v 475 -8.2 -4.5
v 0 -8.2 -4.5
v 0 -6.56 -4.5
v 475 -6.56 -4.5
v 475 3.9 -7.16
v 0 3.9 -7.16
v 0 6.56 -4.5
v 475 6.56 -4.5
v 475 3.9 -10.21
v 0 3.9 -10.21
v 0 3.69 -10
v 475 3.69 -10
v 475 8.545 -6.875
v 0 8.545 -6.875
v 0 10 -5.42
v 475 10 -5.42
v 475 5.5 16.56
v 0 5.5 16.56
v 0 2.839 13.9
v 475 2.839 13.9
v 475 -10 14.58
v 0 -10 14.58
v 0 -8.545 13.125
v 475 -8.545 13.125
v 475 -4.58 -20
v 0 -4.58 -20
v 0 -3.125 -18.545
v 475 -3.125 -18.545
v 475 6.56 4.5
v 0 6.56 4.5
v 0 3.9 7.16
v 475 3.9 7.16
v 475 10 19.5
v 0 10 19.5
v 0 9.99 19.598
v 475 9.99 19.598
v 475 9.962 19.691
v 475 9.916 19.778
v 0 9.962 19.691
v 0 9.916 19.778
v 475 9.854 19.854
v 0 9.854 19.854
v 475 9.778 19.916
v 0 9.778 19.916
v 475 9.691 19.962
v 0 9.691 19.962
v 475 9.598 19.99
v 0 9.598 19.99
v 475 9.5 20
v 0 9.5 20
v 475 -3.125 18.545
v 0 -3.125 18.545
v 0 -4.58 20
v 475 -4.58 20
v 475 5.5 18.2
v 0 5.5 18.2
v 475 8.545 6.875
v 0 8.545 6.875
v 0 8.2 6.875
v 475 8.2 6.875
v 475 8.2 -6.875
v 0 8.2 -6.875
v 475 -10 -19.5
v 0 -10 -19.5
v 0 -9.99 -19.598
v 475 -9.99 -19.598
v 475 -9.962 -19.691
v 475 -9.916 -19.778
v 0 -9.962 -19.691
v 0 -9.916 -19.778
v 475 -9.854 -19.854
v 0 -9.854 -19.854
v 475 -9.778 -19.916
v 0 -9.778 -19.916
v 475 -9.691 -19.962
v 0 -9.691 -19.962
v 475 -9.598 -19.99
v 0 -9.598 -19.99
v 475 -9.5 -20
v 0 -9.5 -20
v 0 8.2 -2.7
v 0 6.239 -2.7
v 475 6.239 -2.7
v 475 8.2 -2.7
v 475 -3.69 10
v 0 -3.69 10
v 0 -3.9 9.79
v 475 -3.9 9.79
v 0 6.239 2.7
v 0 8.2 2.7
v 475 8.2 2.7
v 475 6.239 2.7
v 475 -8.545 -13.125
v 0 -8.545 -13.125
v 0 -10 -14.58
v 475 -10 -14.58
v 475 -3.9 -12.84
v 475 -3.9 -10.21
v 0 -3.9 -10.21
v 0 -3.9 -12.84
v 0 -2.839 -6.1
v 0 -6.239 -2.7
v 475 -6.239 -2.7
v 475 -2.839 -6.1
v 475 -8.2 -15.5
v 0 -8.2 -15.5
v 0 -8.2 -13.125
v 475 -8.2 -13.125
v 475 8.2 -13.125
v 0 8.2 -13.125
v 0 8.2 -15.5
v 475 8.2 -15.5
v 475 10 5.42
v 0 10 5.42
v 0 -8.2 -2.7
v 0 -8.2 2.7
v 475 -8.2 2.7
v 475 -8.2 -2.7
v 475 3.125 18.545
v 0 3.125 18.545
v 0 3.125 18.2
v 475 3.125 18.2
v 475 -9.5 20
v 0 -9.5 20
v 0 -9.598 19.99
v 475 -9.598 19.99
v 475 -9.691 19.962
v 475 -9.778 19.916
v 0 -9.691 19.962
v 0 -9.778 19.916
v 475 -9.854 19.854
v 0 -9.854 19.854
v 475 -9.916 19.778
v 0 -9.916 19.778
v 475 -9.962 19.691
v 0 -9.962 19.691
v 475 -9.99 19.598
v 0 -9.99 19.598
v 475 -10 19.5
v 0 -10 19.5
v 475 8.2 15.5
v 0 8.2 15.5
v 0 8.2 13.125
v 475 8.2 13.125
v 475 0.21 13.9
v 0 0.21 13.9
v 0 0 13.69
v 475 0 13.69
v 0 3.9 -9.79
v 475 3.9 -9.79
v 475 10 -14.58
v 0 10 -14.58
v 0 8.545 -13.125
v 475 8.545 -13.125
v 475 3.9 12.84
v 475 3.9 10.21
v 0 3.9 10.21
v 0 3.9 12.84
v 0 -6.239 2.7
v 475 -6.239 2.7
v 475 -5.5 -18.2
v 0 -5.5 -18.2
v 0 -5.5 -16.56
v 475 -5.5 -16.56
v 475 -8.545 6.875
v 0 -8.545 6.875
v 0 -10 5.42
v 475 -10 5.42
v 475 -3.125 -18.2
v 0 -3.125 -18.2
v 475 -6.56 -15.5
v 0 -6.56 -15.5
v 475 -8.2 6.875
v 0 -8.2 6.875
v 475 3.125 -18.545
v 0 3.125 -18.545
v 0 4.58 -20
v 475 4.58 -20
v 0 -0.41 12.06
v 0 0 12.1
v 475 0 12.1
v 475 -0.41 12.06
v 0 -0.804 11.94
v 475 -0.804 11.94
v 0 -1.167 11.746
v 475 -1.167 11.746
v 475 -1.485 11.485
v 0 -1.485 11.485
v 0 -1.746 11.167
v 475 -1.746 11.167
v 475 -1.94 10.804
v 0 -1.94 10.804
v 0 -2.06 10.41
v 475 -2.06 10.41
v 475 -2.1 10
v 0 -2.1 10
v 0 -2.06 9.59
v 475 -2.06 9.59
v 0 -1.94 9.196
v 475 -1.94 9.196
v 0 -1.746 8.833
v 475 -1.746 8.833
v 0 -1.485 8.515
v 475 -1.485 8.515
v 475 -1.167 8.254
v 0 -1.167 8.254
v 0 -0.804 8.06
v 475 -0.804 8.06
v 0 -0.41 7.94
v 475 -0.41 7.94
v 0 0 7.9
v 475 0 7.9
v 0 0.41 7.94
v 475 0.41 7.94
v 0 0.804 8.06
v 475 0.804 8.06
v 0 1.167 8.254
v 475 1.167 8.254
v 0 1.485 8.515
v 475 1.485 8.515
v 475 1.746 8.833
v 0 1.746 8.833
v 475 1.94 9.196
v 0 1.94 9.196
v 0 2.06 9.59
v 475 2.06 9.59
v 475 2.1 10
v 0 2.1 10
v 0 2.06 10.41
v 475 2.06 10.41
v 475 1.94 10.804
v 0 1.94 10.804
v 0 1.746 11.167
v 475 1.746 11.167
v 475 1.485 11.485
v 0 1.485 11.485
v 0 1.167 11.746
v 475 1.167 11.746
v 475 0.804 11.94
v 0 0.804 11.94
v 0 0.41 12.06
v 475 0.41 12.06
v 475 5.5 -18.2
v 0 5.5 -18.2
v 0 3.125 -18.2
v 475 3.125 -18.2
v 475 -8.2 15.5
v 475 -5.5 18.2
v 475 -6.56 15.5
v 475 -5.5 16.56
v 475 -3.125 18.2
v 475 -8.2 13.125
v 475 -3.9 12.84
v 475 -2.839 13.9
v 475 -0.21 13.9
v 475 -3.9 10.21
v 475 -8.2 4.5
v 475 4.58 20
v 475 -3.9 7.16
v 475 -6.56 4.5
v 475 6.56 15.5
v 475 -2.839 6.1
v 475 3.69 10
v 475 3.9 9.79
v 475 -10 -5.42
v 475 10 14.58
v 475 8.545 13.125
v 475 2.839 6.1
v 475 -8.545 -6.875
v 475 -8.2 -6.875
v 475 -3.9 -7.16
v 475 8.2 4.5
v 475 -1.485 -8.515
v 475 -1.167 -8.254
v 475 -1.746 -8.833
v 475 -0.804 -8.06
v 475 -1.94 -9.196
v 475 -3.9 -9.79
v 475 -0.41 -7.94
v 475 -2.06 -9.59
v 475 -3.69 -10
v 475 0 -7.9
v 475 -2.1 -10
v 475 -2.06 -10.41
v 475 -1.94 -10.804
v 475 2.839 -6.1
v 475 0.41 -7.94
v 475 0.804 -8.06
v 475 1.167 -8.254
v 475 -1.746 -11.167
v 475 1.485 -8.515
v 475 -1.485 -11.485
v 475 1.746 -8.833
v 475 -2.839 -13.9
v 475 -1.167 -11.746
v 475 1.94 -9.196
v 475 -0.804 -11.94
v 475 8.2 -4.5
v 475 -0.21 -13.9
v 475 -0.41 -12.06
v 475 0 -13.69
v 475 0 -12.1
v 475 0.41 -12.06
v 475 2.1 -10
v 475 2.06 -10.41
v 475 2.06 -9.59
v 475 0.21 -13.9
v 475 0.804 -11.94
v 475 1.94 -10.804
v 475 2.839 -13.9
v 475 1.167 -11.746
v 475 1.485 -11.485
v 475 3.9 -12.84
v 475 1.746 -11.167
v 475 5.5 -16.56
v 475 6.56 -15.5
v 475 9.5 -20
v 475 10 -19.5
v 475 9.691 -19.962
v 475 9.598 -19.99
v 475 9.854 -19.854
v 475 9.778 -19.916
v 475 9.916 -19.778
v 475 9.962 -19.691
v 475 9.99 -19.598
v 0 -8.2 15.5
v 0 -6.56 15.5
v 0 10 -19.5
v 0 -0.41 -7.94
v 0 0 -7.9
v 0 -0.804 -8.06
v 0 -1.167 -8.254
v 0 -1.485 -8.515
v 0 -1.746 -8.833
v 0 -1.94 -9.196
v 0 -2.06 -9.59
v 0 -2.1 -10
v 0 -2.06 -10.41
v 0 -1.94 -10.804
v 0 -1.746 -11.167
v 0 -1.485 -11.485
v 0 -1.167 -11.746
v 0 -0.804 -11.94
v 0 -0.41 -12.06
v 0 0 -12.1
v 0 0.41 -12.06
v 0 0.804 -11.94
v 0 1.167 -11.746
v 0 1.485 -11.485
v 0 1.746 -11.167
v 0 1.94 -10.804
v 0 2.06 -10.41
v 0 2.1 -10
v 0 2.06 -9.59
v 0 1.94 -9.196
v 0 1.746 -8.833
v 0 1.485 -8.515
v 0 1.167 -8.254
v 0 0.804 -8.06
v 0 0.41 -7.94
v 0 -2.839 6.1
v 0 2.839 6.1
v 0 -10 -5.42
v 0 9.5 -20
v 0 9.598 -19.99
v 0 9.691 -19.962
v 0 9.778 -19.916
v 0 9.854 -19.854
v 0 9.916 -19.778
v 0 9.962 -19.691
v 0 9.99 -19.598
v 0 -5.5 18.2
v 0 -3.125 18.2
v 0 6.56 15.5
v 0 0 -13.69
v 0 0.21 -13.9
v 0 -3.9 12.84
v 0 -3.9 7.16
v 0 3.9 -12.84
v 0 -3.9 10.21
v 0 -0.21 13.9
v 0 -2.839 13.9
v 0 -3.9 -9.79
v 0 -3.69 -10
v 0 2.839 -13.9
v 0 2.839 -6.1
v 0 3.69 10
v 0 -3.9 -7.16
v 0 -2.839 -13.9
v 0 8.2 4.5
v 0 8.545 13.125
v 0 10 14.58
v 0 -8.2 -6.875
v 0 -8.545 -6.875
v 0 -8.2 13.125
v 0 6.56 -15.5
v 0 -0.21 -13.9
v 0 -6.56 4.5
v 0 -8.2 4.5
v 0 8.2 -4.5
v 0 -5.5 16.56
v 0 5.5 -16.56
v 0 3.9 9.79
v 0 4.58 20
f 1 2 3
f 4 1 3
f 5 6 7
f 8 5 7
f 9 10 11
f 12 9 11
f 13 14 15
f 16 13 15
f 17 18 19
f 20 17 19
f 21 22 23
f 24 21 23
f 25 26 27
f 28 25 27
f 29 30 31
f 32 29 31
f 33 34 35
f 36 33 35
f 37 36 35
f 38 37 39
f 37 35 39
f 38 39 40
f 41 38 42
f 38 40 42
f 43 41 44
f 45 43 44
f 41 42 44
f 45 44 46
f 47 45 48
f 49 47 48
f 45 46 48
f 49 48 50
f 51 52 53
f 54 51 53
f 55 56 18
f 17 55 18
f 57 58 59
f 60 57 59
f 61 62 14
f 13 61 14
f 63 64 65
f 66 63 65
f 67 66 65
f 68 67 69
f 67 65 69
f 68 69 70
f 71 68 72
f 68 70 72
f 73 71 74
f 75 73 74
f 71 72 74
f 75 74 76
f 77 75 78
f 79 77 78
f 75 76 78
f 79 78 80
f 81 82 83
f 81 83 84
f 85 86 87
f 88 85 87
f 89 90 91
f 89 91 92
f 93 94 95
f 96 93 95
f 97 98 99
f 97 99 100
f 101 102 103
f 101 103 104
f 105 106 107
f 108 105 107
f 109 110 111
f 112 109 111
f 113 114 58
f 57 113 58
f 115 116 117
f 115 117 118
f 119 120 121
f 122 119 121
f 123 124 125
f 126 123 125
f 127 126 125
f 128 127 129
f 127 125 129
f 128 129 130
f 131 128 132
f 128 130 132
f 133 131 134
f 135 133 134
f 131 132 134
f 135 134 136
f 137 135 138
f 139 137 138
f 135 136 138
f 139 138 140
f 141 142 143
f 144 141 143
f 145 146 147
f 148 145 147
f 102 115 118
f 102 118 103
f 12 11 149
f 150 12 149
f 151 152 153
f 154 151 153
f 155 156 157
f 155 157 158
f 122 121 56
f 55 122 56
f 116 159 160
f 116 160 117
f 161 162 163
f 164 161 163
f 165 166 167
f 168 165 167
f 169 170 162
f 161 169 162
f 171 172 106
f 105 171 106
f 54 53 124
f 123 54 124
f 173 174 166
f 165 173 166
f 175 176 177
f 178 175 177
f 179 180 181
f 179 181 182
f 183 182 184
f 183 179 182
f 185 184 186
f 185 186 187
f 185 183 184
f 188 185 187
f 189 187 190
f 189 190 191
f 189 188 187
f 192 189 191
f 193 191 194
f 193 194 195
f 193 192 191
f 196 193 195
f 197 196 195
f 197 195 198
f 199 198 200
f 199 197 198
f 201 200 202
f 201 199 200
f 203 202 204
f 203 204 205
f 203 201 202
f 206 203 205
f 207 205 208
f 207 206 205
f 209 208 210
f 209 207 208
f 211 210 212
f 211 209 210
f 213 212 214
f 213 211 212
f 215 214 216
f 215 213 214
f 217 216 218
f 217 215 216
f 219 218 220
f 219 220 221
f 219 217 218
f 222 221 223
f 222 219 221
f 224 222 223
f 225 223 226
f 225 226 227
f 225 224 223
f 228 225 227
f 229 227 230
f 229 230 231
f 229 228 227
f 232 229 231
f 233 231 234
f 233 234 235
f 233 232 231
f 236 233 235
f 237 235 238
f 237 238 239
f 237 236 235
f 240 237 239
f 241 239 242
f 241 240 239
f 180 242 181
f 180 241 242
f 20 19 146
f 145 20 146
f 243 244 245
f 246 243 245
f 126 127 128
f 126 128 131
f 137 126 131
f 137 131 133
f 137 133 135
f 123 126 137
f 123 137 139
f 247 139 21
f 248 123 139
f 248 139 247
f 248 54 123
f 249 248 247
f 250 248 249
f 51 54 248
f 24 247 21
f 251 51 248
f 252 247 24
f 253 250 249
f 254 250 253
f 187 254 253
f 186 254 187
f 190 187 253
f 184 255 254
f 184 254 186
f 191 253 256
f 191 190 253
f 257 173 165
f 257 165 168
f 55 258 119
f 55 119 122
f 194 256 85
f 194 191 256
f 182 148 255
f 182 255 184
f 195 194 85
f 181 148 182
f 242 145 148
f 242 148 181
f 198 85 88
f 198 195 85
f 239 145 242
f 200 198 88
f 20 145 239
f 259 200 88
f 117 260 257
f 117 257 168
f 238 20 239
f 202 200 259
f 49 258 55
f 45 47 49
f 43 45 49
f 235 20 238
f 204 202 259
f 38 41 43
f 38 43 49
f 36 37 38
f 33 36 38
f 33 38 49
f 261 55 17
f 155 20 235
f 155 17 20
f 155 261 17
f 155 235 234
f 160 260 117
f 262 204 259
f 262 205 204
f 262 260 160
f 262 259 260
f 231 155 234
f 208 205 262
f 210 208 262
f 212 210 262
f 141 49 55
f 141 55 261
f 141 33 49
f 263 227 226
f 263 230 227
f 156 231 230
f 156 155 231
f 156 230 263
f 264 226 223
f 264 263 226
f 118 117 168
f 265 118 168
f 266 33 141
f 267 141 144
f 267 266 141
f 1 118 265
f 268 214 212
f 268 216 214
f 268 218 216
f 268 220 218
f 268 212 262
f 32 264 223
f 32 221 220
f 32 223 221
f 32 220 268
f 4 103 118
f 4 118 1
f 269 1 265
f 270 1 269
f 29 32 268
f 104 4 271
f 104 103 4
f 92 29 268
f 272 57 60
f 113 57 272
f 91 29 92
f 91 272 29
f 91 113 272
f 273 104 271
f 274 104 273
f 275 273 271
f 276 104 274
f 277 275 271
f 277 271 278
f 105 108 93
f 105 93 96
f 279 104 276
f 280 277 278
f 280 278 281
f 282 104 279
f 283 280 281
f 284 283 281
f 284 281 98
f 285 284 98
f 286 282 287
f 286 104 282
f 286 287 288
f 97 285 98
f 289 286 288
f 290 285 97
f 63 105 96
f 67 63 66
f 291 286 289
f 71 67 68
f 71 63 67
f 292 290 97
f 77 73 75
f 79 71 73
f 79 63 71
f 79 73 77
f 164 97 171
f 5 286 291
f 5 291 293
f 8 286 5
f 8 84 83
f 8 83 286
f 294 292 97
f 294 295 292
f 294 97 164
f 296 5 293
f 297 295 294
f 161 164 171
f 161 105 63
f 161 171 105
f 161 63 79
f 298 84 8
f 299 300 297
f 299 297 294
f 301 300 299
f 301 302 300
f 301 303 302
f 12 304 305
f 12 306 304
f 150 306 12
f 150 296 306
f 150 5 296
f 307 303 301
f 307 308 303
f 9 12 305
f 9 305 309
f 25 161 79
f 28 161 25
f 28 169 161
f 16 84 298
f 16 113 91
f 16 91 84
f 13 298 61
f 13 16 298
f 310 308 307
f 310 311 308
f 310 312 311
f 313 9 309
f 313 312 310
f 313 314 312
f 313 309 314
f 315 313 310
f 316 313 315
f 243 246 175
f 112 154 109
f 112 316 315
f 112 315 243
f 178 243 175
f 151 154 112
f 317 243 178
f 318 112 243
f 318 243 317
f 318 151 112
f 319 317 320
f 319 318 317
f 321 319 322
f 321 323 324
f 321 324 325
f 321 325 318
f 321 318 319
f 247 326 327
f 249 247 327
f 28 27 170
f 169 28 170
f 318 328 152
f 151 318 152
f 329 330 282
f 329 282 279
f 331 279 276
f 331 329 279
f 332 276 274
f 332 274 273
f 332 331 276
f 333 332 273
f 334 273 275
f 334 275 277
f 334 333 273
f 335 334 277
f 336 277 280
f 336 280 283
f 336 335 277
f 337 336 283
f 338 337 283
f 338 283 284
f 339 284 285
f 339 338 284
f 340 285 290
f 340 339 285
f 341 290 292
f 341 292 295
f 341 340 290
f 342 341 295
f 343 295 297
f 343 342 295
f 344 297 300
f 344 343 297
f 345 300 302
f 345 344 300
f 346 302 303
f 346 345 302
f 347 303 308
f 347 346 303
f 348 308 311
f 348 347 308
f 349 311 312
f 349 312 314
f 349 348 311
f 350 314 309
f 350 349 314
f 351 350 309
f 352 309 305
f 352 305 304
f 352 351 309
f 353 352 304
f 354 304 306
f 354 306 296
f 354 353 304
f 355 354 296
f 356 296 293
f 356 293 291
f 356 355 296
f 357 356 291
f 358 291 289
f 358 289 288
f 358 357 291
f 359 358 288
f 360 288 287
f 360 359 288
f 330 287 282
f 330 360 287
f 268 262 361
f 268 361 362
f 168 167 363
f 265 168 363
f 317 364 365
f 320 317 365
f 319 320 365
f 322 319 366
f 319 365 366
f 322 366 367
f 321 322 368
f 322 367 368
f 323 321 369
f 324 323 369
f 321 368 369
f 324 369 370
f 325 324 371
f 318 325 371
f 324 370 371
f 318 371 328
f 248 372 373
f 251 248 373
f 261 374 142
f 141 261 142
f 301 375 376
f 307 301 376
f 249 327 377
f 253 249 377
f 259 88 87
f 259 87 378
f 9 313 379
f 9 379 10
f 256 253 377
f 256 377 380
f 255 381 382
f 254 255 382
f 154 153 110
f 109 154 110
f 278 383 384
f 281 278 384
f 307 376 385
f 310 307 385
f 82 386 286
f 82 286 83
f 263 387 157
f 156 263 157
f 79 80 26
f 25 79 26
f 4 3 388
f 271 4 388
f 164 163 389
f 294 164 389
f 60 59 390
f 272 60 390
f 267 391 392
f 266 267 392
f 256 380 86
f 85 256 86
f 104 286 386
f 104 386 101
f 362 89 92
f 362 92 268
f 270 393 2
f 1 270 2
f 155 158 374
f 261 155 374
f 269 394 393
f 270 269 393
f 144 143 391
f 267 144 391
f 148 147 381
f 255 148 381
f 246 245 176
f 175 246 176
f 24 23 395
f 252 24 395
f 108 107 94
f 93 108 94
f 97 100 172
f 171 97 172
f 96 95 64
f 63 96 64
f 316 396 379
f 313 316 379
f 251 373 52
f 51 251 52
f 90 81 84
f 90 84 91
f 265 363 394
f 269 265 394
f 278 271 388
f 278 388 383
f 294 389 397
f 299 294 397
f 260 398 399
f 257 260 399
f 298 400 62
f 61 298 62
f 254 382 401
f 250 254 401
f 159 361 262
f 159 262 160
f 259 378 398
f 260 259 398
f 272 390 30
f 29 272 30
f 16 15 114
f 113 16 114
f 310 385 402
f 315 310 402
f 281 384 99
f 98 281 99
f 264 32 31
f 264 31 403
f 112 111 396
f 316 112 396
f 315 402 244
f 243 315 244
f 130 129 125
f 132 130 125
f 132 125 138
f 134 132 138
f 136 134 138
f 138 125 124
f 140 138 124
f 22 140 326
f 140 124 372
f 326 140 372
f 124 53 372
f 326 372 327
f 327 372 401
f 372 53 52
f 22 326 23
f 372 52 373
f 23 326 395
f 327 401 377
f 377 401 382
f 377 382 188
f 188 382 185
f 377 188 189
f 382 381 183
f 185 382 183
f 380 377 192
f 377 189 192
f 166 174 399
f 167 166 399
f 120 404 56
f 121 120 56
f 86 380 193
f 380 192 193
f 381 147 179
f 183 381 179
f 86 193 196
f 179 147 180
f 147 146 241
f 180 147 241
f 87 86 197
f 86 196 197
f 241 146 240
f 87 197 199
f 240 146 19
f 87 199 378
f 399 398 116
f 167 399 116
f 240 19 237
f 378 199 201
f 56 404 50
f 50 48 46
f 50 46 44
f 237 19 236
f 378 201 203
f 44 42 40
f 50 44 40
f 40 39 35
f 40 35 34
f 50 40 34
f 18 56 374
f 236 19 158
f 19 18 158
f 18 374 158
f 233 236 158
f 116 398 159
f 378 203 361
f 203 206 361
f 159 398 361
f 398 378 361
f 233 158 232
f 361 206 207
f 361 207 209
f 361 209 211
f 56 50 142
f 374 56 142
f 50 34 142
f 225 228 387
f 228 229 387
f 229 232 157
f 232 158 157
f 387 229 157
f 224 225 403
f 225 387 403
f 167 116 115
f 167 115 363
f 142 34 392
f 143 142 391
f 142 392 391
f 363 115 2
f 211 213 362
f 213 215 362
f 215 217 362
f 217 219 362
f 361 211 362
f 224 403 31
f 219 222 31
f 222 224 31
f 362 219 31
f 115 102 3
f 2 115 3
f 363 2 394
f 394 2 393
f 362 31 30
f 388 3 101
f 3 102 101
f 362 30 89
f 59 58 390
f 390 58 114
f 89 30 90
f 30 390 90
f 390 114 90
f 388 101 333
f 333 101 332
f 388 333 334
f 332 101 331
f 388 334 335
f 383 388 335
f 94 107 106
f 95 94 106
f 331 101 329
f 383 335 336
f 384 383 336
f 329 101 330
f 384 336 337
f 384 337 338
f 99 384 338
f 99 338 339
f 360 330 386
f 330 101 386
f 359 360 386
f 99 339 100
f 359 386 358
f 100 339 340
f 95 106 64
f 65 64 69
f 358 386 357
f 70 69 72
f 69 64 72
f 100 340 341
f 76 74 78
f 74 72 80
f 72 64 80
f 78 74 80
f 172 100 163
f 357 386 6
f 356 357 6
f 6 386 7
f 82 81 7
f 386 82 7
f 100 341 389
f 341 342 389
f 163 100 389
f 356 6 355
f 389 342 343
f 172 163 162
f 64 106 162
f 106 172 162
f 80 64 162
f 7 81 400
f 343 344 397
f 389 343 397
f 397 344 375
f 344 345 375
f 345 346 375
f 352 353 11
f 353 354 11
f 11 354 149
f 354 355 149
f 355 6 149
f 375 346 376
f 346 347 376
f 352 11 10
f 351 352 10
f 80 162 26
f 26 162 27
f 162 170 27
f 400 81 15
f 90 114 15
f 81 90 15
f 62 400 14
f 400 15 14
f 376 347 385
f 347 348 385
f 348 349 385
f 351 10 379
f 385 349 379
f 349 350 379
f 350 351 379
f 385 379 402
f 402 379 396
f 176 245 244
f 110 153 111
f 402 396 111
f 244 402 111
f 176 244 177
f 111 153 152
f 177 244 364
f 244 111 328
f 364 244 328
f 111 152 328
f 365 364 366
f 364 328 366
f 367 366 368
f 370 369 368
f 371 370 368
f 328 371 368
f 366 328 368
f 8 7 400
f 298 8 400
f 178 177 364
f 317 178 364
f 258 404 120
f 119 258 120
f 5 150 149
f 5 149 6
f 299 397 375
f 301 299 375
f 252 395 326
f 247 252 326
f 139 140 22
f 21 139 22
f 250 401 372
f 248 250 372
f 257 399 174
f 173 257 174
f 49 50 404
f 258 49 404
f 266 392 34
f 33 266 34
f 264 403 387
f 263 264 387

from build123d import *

# Parameters (mm, degrees)
PROFILE_SKETCH_R      = 2.1
PROFILE_EXTRUDE_DEPTH = 475


with BuildPart() as part:
    # Profile Sketch → Profile Extrude (new body)
    with BuildSketch(Plane(origin=(0, 0, 0), x_dir=(0, 0, -1), z_dir=(1, 0, 0))):
        with BuildLine():
            Line((5.42, 10), (-5.42, 10))
            Line((-5.42, 10), (-6.875, 8.545))
            Line((-6.875, 8.545), (-6.875, 8.2))
            Line((-6.875, 8.2), (-4.5, 8.2))
            Line((-4.5, 8.2), (-4.5, 6.56))
            Line((-4.5, 6.56), (-7.16, 3.9))
            Line((-7.16, 3.9), (-9.79, 3.9))
            Line((-9.79, 3.9), (-10, 3.69))
            Line((-10, 3.69), (-10.21, 3.9))
            Line((-10.21, 3.9), (-12.84, 3.9))
            Line((-12.84, 3.9), (-15.5, 6.56))
            Line((-15.5, 6.56), (-15.5, 8.2))
            Line((-15.5, 8.2), (-13.125, 8.2))
            Line((-13.125, 8.2), (-13.125, 8.545))
            Line((-13.125, 8.545), (-14.58, 10))
            Line((-14.58, 10), (-19.5, 10))
            ThreePointArc((-19.5, 10), (-19.853553391, 9.853553391), (-20, 9.5))
            Line((-20, 9.5), (-20, 4.58))
            Line((-20, 4.58), (-18.545, 3.125))
            Line((-18.545, 3.125), (-18.2, 3.125))
            Line((-18.2, 3.125), (-18.2, 5.5))
            Line((-18.2, 5.5), (-16.56, 5.5))
            Line((-16.56, 5.5), (-13.9, 2.838679656))
            Line((-13.9, 2.838679656), (-13.9, 0.21))
            Line((-13.9, 0.21), (-13.69, 0))
            Line((-13.69, 0), (-13.9, -0.21))
            Line((-13.9, -0.21), (-13.9, -2.838679656))
            Line((-13.9, -2.838679656), (-16.56, -5.5))
            Line((-16.56, -5.5), (-18.2, -5.5))
            Line((-18.2, -5.5), (-18.2, -3.125))
            Line((-18.2, -3.125), (-18.545, -3.125))
            Line((-18.545, -3.125), (-20, -4.58))
            Line((-20, -4.58), (-20, -9.5))
            ThreePointArc((-20, -9.5), (-19.853553391, -9.853553391), (-19.5, -10))
            Line((-19.5, -10), (-14.58, -10))
            Line((-14.58, -10), (-13.125, -8.545))
            Line((-13.125, -8.545), (-13.125, -8.2))
            Line((-13.125, -8.2), (-15.5, -8.2))
            Line((-15.5, -8.2), (-15.5, -6.56))
            Line((-15.5, -6.56), (-12.84, -3.9))
            Line((-12.84, -3.9), (-10.21, -3.9))
            Line((-10.21, -3.9), (-10, -3.69))
            Line((-10, -3.69), (-9.79, -3.9))
            Line((-9.79, -3.9), (-7.16, -3.9))
            Line((-7.16, -3.9), (-4.5, -6.56))
            Line((-4.5, -6.56), (-4.5, -8.2))
            Line((-4.5, -8.2), (-6.875, -8.2))
            Line((-6.875, -8.2), (-6.875, -8.545))
            Line((-6.875, -8.545), (-5.42, -10))
            Line((-5.42, -10), (5.42, -10))
            Line((5.42, -10), (6.875, -8.545))
            Line((6.875, -8.545), (6.875, -8.2))
            Line((6.875, -8.2), (4.5, -8.2))
            Line((4.5, -8.2), (4.5, -6.56))
            Line((4.5, -6.56), (7.16, -3.9))
            Line((7.16, -3.9), (9.79, -3.9))
            Line((9.79, -3.9), (10, -3.69))
            Line((10, -3.69), (10.21, -3.9))
            Line((10.21, -3.9), (12.84, -3.9))
            Line((12.84, -3.9), (15.5, -6.56))
            Line((15.5, -6.56), (15.5, -8.2))
            Line((15.5, -8.2), (13.125, -8.2))
            Line((13.125, -8.2), (13.125, -8.545))
            Line((13.125, -8.545), (14.58, -10))
            Line((14.58, -10), (19.5, -10))
            ThreePointArc((19.5, -10), (19.853553391, -9.853553391), (20, -9.5))
            Line((20, -9.5), (20, -4.58))
            Line((20, -4.58), (18.545, -3.125))
            Line((18.545, -3.125), (18.2, -3.125))
            Line((18.2, -3.125), (18.2, -5.5))
            Line((18.2, -5.5), (16.56, -5.5))
            Line((16.56, -5.5), (13.9, -2.838679656))
            Line((13.9, -2.838679656), (13.9, -0.21))
            Line((13.9, -0.21), (13.69, 0))
            Line((13.69, 0), (13.9, 0.21))
            Line((13.9, 0.21), (13.9, 2.838679656))
            Line((13.9, 2.838679656), (16.56, 5.5))
            Line((16.56, 5.5), (18.2, 5.5))
            Line((18.2, 5.5), (18.2, 3.125))
            Line((18.2, 3.125), (18.545, 3.125))
            Line((18.545, 3.125), (20, 4.58))
            Line((20, 4.58), (20, 9.5))
            ThreePointArc((20, 9.5), (19.853553391, 9.853553391), (19.5, 10))
            Line((19.5, 10), (14.58, 10))
            Line((14.58, 10), (13.125, 8.545))
            Line((13.125, 8.545), (13.125, 8.2))
            Line((13.125, 8.2), (15.5, 8.2))
            Line((15.5, 8.2), (15.5, 6.56))
            Line((15.5, 6.56), (12.84, 3.9))
            Line((12.84, 3.9), (10.21, 3.9))
            Line((10.21, 3.9), (10, 3.69))
            Line((10, 3.69), (9.79, 3.9))
            Line((9.79, 3.9), (7.16, 3.9))
            Line((7.16, 3.9), (4.5, 6.56))
            Line((4.5, 6.56), (4.5, 8.2))
            Line((4.5, 8.2), (6.875, 8.2))
            Line((6.875, 8.2), (6.875, 8.545))
            Line((6.875, 8.545), (5.42, 10))
        make_face()
        with Locations(Location((-10, 0, 0), (0, 0, 180))):
            Circle(PROFILE_SKETCH_R, mode=Mode.SUBTRACT)
        with Locations(Location((10, 0, 0), (0, 0, 180))):
            Circle(PROFILE_SKETCH_R, mode=Mode.SUBTRACT)
        Polygon((2.7, 8.2), (-2.7, 8.2), (-2.7, 6.238679656), (-6.1, 2.838679656), (-6.1, -0.21), (-6.1, -2.838679656), (-2.7, -6.238679656), (-2.7, -8.2), (2.7, -8.2), (2.7, -6.238679656), (6.1, -2.838679656), (6.1, -0.21), (6.1, 2.838679656), (2.7, 6.238679656), align=None, mode=Mode.SUBTRACT)
    extrude(amount=PROFILE_EXTRUDE_DEPTH)


solid = part.part
